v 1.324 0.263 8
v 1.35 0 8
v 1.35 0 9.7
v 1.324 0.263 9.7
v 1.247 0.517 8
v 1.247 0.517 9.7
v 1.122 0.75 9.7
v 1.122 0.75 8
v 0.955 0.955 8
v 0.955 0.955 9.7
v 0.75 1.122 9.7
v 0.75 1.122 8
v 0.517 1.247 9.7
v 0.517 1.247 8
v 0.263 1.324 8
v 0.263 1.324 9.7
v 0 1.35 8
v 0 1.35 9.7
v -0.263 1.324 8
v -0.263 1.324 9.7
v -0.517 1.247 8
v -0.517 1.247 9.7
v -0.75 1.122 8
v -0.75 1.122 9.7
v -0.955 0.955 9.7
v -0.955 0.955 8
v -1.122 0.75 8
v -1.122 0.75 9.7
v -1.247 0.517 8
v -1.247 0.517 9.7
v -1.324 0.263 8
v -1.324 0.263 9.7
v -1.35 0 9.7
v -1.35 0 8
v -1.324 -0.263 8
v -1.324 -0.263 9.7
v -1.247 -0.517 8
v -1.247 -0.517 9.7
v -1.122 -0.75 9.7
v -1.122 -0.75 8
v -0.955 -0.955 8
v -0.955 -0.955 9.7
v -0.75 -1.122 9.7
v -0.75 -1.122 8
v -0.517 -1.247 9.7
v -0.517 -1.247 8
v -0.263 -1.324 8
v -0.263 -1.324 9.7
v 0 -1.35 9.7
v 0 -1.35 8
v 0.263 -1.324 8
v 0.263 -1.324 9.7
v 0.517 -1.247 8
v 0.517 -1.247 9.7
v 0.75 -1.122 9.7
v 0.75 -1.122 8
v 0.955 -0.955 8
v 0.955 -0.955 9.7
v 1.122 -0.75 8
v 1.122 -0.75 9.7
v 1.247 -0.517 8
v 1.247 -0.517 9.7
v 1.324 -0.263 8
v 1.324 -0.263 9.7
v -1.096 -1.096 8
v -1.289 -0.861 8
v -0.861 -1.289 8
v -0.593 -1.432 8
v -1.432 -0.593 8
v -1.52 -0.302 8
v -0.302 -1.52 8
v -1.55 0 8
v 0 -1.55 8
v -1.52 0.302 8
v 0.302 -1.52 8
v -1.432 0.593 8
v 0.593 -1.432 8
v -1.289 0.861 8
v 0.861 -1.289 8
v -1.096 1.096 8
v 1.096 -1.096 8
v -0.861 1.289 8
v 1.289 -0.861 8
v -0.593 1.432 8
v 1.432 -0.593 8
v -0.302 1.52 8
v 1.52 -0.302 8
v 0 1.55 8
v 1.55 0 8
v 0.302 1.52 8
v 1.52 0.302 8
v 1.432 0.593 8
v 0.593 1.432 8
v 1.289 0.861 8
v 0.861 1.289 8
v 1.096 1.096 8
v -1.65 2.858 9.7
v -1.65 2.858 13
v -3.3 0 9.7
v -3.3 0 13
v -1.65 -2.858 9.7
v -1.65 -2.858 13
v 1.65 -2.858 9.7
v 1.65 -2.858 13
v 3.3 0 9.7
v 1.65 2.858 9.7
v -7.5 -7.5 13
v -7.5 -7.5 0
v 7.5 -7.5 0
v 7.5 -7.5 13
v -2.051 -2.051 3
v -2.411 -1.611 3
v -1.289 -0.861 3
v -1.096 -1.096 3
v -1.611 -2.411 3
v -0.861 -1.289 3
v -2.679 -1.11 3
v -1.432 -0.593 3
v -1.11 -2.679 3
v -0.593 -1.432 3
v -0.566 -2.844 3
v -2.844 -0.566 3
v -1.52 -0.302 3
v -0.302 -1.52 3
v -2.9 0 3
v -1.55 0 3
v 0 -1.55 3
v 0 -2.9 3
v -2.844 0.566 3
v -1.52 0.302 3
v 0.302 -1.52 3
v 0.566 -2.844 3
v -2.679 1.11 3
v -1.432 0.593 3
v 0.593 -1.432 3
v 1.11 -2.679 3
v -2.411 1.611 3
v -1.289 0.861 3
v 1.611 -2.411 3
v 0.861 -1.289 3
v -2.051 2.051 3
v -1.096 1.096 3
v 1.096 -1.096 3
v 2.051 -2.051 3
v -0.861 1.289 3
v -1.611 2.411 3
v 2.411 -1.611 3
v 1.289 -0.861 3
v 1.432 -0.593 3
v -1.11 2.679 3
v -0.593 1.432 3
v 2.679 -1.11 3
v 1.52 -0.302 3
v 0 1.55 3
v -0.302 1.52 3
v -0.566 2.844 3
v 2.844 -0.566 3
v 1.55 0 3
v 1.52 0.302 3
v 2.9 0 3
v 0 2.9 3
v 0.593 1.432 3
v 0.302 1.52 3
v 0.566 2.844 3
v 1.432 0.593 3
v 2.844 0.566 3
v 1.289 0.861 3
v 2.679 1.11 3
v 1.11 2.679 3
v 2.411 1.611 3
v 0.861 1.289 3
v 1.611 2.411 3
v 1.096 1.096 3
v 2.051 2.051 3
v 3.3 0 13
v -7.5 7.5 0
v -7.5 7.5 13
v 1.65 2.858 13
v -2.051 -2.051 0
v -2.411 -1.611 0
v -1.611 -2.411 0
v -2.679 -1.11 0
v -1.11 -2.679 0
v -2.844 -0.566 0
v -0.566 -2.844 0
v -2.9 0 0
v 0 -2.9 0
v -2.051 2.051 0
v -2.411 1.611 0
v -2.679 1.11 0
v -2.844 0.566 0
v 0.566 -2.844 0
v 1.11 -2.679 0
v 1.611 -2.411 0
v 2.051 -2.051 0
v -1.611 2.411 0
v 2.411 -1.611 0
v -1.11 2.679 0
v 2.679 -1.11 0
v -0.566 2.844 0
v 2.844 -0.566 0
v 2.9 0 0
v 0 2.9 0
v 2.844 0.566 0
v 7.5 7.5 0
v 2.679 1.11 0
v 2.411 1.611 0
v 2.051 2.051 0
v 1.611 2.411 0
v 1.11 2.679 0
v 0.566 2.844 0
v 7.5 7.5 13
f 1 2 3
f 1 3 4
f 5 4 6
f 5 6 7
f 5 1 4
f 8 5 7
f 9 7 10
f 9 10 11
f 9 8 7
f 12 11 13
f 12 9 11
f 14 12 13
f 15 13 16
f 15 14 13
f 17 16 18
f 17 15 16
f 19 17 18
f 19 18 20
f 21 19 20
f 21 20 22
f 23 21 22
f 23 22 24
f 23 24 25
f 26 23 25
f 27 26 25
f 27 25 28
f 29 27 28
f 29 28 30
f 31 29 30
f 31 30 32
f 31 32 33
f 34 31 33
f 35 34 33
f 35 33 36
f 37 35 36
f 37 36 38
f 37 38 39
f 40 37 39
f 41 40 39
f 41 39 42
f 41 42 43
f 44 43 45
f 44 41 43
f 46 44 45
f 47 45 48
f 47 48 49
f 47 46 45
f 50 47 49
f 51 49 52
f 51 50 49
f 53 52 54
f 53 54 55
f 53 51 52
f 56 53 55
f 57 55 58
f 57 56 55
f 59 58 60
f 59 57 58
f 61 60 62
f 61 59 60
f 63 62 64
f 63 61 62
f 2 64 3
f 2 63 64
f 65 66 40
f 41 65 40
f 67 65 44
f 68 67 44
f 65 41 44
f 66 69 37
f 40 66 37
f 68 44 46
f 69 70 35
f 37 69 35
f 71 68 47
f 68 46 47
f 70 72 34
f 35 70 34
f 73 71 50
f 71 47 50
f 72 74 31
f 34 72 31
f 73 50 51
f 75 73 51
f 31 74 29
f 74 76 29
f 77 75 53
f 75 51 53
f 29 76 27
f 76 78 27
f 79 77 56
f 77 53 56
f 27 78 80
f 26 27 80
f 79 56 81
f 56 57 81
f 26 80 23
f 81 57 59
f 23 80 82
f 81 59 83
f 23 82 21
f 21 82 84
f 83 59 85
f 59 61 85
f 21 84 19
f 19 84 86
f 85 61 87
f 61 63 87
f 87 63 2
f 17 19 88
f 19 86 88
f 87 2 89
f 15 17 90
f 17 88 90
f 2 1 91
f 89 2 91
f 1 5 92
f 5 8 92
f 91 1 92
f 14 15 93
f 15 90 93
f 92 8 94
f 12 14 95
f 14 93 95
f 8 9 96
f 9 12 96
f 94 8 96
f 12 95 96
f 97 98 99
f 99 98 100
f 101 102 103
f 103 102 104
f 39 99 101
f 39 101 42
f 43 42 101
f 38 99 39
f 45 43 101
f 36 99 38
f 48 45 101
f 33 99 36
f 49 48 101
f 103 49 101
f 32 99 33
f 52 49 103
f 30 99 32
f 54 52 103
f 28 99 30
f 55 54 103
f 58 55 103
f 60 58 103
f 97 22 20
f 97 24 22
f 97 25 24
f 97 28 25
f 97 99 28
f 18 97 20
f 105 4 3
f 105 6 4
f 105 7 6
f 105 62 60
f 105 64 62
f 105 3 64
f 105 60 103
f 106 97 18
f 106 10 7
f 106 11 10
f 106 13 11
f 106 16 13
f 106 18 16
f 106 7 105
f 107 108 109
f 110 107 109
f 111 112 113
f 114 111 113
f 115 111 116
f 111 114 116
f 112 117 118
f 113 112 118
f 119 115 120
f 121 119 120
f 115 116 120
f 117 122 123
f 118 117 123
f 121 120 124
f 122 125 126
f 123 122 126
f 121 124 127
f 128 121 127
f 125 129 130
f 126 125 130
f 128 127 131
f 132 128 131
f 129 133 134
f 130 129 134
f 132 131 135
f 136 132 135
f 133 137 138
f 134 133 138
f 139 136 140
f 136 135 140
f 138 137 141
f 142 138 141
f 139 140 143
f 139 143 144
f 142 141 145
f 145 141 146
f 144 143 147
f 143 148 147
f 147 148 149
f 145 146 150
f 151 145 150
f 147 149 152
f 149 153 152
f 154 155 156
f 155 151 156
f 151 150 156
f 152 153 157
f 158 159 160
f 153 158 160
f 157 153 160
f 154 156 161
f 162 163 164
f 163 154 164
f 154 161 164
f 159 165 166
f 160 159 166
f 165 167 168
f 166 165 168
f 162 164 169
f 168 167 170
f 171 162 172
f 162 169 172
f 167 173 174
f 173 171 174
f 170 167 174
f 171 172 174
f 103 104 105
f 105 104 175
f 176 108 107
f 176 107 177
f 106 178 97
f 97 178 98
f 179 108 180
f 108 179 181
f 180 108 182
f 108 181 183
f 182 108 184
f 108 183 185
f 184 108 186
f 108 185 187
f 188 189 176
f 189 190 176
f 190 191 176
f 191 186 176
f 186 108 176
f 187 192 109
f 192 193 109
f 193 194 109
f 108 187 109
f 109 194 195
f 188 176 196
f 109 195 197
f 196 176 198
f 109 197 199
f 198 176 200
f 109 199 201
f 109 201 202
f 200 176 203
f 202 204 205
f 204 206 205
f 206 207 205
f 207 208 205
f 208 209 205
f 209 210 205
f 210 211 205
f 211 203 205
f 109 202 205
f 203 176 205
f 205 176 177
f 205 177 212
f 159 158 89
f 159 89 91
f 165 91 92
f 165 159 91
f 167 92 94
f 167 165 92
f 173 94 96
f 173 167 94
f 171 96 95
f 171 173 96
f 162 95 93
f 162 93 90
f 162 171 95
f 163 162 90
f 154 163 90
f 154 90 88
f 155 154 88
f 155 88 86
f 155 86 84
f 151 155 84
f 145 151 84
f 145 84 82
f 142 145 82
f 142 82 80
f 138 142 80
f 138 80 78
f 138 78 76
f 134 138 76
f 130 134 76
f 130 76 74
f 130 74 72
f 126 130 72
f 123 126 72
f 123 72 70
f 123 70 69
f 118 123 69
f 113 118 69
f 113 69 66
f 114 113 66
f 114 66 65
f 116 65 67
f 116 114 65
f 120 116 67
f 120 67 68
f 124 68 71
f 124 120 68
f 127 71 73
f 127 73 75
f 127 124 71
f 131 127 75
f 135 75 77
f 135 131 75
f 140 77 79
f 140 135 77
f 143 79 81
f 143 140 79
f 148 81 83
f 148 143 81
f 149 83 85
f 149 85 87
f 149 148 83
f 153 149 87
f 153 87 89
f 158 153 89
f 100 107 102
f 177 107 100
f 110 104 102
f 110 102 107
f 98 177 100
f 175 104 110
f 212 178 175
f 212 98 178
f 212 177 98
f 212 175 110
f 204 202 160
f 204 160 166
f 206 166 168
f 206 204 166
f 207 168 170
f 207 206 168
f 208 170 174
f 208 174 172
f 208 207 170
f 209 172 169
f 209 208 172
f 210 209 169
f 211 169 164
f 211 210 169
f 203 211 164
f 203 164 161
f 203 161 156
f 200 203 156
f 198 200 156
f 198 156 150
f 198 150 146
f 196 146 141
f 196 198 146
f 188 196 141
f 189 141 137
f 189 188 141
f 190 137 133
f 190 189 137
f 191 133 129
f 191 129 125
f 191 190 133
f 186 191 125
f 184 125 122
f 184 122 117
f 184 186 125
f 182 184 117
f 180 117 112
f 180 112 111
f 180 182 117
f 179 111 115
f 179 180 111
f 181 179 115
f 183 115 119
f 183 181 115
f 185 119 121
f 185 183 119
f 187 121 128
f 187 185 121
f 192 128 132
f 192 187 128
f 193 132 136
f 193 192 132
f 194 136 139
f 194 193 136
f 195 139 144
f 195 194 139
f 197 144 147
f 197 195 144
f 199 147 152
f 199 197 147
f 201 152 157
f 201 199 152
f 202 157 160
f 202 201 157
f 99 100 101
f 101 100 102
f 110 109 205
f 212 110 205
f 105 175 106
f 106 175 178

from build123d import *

# Parameters (mm, degrees)
F0_W     = 15
F0_H     = 15
F0_R     = 2.9
F0_R_2   = 1.55
F0_R_3   = 1.35
F1_DEPTH = 13
F2_DEPTH = 8
F3_DEPTH = 3
F4_R     = 1.35
F5_DEPTH = 3.3


with BuildPart() as f1:
    # F0 (on Top) → F1 (new body)
    with BuildSketch(Plane.XY):
        Rectangle(F0_W, F0_H)
        Circle(F0_R, mode=Mode.SUBTRACT)
        Circle(F0_R)
        Circle(F0_R_2, mode=Mode.SUBTRACT)
        Circle(F0_R_2)
        Circle(F0_R_3, mode=Mode.SUBTRACT)
    extrude(amount=F1_DEPTH)

    # F0 (on Top) → F2 (cut)
    with BuildSketch(Plane.XY):
        Circle(F0_R_2)
        Circle(F0_R_3, mode=Mode.SUBTRACT)
    extrude(amount=F2_DEPTH, mode=Mode.SUBTRACT)

    # F0 (on Top) → F3 (cut)
    with BuildSketch(Plane.XY):
        Circle(F0_R)
        Circle(F0_R_2, mode=Mode.SUBTRACT)
    extrude(amount=F3_DEPTH, mode=Mode.SUBTRACT)

    # F4 (on face) → F5 (cut)
    with BuildSketch(Plane.XY.offset(13)):
        Polygon((3.3, 0), (1.65, 2.857884), (-1.65, 2.857884), (-3.3, 0), (-1.65, -2.857884), (1.65, -2.857884), align=None)
        Circle(F4_R, mode=Mode.SUBTRACT)
    extrude(amount=-F5_DEPTH, mode=Mode.SUBTRACT)


solid = f1.part
